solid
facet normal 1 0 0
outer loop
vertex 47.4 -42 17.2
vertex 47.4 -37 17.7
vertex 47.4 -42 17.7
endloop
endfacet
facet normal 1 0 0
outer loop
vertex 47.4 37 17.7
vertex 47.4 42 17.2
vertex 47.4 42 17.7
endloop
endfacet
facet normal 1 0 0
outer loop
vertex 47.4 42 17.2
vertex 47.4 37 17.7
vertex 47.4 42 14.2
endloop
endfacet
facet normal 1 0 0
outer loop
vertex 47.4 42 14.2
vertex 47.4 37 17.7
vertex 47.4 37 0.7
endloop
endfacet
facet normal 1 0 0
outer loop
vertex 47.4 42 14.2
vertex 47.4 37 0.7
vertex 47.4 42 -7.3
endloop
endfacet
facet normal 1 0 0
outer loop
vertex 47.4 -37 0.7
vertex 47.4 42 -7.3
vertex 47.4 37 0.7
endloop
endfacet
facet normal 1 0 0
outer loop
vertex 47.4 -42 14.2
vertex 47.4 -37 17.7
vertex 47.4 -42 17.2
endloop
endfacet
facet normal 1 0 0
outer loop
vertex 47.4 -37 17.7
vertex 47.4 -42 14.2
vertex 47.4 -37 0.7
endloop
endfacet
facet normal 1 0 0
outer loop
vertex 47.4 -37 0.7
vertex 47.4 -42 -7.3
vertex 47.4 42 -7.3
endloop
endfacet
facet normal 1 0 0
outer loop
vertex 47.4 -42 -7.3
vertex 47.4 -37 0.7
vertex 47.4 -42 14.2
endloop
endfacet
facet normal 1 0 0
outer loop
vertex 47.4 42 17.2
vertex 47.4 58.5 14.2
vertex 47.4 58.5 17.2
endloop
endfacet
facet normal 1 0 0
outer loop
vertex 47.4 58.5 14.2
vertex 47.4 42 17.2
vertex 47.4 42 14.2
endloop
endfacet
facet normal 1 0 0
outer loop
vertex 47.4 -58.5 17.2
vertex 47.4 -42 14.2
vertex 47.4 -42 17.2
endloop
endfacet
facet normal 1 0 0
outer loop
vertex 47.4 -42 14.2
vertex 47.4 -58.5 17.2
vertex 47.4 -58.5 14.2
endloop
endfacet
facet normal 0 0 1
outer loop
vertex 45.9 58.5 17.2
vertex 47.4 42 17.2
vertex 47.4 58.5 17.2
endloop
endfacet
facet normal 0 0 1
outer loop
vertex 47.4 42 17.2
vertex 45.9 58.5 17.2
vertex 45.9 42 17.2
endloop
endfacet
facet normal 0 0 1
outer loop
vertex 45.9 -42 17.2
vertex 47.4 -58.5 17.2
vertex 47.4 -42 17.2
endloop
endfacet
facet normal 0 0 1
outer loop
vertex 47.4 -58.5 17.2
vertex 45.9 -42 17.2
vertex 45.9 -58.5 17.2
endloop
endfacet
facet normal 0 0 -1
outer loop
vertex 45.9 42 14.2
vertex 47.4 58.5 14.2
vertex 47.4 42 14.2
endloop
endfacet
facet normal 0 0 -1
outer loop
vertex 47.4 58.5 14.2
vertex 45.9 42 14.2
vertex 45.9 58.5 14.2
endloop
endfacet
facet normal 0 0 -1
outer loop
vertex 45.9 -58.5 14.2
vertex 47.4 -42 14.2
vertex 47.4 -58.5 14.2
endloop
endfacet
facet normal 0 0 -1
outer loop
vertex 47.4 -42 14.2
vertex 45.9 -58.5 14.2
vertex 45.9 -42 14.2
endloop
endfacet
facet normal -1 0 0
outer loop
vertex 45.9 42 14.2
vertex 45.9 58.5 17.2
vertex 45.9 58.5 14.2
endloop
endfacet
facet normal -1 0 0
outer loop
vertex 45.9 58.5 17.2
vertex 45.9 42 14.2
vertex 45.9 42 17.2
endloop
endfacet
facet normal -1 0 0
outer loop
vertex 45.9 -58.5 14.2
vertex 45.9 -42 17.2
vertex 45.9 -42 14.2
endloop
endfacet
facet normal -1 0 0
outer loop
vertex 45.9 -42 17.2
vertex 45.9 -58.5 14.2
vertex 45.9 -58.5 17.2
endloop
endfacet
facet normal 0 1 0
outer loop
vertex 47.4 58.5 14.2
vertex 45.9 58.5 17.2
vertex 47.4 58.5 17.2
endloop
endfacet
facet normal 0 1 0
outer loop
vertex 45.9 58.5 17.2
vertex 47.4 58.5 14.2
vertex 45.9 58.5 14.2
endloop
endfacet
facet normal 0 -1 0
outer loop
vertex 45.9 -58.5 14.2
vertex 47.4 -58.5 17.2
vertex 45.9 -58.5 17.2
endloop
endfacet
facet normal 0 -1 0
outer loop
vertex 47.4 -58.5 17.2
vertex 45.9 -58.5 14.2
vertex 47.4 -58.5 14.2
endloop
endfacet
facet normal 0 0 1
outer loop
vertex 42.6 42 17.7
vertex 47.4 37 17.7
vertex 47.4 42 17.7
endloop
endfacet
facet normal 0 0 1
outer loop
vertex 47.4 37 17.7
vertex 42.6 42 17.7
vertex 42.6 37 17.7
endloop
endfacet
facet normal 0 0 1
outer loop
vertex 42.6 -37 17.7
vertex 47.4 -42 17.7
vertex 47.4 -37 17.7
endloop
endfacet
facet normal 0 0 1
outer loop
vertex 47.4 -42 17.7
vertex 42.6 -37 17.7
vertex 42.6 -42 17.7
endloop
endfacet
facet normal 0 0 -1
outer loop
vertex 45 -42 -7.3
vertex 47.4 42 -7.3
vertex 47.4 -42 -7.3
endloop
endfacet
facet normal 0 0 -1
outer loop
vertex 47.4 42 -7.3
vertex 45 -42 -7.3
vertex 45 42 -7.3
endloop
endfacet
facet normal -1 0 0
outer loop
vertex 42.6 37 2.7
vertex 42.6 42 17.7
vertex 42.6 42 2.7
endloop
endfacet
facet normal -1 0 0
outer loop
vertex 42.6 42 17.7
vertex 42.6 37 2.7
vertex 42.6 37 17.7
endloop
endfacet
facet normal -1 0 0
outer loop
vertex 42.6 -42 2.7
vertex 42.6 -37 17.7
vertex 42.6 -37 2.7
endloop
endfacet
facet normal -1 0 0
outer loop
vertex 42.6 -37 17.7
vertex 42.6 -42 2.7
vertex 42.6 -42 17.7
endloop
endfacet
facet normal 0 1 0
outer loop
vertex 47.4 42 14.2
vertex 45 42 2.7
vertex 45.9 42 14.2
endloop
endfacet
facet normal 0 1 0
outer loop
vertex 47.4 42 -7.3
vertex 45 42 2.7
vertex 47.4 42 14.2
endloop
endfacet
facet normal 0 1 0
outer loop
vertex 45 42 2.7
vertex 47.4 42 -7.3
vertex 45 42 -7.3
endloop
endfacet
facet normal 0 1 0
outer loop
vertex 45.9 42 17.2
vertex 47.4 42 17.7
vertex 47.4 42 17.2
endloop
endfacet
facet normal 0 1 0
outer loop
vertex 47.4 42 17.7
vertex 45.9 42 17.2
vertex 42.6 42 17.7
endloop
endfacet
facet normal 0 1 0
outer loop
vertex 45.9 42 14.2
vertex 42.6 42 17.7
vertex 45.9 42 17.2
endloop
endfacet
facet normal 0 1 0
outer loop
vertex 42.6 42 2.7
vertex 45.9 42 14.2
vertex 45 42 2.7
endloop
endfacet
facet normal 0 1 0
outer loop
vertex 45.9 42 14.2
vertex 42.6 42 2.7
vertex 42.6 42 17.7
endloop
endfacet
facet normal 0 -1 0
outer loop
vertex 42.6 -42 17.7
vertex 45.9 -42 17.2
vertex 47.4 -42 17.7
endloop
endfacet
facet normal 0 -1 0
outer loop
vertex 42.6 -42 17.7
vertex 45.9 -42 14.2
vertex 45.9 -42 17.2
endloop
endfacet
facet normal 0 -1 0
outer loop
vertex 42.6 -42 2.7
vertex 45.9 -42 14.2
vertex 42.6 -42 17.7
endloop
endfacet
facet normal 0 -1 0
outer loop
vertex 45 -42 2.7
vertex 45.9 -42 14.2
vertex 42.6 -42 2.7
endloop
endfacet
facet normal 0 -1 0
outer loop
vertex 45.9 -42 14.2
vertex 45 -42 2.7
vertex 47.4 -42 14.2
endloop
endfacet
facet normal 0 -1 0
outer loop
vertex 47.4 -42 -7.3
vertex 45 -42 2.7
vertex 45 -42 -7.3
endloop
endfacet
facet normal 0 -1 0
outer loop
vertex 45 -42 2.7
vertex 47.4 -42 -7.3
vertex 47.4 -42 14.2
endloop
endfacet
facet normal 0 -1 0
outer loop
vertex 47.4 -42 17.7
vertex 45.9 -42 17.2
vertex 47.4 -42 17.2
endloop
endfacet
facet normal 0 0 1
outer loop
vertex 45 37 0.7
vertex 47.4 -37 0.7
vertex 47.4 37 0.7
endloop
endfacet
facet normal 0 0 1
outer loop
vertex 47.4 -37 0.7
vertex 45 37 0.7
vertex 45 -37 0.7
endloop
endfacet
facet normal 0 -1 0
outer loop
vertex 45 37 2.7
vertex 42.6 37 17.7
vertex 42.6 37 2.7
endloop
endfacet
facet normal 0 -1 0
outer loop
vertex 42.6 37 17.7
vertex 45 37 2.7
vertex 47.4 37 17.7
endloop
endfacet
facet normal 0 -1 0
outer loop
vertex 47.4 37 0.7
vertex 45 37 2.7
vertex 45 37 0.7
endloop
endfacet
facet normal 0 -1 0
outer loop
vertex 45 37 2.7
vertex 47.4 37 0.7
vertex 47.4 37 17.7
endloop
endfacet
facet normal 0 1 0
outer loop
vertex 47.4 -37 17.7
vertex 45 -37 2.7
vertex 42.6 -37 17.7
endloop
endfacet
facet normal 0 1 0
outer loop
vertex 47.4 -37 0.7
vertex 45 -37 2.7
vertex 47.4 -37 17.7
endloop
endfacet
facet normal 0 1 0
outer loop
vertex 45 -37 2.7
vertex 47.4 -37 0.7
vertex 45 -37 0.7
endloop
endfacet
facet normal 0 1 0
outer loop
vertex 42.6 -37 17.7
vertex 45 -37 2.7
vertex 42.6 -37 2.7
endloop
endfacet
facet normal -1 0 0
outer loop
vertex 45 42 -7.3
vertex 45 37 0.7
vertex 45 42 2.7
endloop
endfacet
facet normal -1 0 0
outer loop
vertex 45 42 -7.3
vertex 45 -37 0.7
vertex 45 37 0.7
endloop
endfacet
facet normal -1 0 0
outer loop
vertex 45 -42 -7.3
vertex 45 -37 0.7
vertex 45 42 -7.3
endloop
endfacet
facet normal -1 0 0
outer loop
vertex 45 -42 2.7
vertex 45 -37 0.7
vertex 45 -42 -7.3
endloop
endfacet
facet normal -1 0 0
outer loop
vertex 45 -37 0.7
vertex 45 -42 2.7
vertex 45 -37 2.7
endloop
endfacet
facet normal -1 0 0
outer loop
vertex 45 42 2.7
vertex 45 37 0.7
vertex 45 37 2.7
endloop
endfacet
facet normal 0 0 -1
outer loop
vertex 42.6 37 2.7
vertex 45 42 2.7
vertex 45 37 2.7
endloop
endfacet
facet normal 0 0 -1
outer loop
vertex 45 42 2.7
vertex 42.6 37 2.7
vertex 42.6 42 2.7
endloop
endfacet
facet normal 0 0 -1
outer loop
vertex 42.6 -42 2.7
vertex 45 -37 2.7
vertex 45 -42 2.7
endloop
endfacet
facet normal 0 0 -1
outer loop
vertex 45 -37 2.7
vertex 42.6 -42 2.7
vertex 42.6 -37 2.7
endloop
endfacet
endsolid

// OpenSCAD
use <MCAD/boxes.scad>

$fn=50;

height = 25;

glass_x = 102;
glass_y = 82;
glass_h = 2.7;
wall = 3;

wet_x = glass_x + 25;
wet_y = glass_y + 10;

comb_tooth_h = 10;

comb_site_tooth_h = 5;
comb_site_top_h = wall+glass_h+comb_tooth_h+comb_site_tooth_h;
comb_site_tooth_h = 5;
wire_holder_z = 5;

wire_d = 2;

istep = 10;
comb_site_width = 6;
comb_site_count = 9;

banana_d = 5+0.5;

hole_d = 3.2;

font = "Liberation Sans";

// for 0.3mm
comb_thick_x = 4.8;
comb_thin_x = 1.5;
comb_well_x = 1.5;

module border() {
  h = height;
  translate([0, 0, -h/2]) {
    difference() {
      union() {
        // handle
        translate([-(comb_thin_x-comb_thick_x)/2, 0, h/2-4/2]) {
          cube([comb_thin_x, wet_y+25, 3], center=true);
        }
        // with side gap along y
        cube([comb_thick_x, wet_y-8, h], center=true);
      }
      // remove top
      translate([0, 0, 6]) {
        cube([comb_thick_x, wet_y-18, h-4], center=true);
      }
      // make middle thinner
      translate([-(comb_thick_x-comb_thin_x)/2, 0, -12]) {
        cube([comb_thick_x-comb_thin_x, wet_y, h-6], center=true);
      }
    }
  }
}

module comb() {
  h = 15;
  tooth_size = 5;
  translate([0, 0, h/2-height/2]) {
    // handle
    difference() {
      union() {
        // handle
        translate([(comb_thick_x-comb_thin_x)/2, 0, 6]) {
          cube([comb_thin_x, wet_y+25, 4], center=true);
        }
        // with side gap along y
        cube([comb_thick_x, wet_y-3, h], center=true);
      }
      // remove top
      translate([0, 0, 4]) {
        cube([comb_thick_x, wet_y-10, h-3], center=true);
      }
      // make middle thinner
      translate([(comb_thick_x-comb_thin_x)/2, 0, 0]) {
        cube([comb_thin_x, wet_y-10, h-3], center=true);
      }
    }
    // comb
    translate([0, 0, -comb_tooth_h/2-h/2]) {
      for(y=[-3:1:3]) {
        translate([(comb_thick_x-comb_well_x)/2, y * 10, 0]) {
          cube([comb_well_x, tooth_size, comb_tooth_h], center=true);
        }
      }
    }
  }
}

module banana_hole(socket=false) {
  translate([0, glass_y/2, height/2-10]) {
    rotate([90, 0, 0]) {
      if(socket) {
        translate([-1, 5, -10]) {
          cylinder(d=banana_d, h=50, center=true);
        }
      } else {
        translate([-2, 1, -22]) {
          roundedBox([10, 16, 30], 5, true);
          translate([0, 4, 0]) {
            cylinder(d=hole_d, h=50, center=true);
          }
          // for wire
          translate([7, 4, 0]) {
            cylinder(d=2.5, h=50, center=true);
          }
        }
      }
    }
  }
}

module wire_holder() {
  d_pad = 2;
  d = wire_d + d_pad*2;
  w = 2;
  translate([-d/4, 0, -d/4*3]) {
    union() {
      difference() {
        rotate([90, 0, 0]) {
          difference() {
            cylinder(d=d, h=w, center=true);
            cylinder(d=wire_d, h=w, center=true);
          }
        }
        translate([0, 0, -d/2]) {
          cube([d, w*2, d], center=true);
        }
        translate([-d/2, 0, 0]) {
          cube([d, w*2, d], center=true);
        }
      }
      translate([-d/4, 0, wire_d]) {
        cube([d/4*3, w, d_pad], center=true);
      }
      translate([wire_d, 0, -d/4]) {
        cube([d_pad, w, d/4*3], center=true);
      }
    }
  }
//  hh = 3.5;
//  hw = 6;
//  translate([2, 0, wall+glass_h-height/2+hh/2]) {
//    cube([3, 2, hh], center=true);
//    translate([1.5-hw/2, 0, hh/2]) {
//      cube([hw, 2, 2], center=true);
//    }
//  }
}

module chamber() {
  difference() {
//  union() {
    // walls
    cube([wet_x+2*wall, wet_y+2*wall, height], center=true);
    translate([0, 0, 0]) {
      // attach zone
      translate([0, 0, comb_site_top_h]) {
        cube([glass_x, wet_y, height], center=true);
        // comb zone
        comb_start = -comb_site_count/2;
        comb_end = comb_site_count/2;
        for(i=[comb_start:comb_end]) {
          translate([i*istep, 0, 0]) {
            translate([0, 0, -comb_site_tooth_h]) {
              cube([comb_site_width, wet_y, height], center=true);
            }
            // get low to the glass level for rubber
            translate([0, 0, -comb_site_top_h+wall+glass_h]) {
              if(i == comb_start) {
                cube([5, glass_y+5, height], center=true);
              } else if(i == comb_end) {
                cube([5, glass_y+5, height], center=true);
              }
            }
          }
        }
      }
      // water zone
      translate([0, 0, 3+glass_h]) {
        cube([wet_x, glass_y, height], center=true);
      }
      // extraction bigger
      translate([0, 0, 3]) {
        cube([glass_x, glass_y, height], center=true);
      }
      translate([0, 0, 0]) {
        // extraction smaller with pads
        cube([glass_x-5, glass_y-7, height], center=true);
      }
      // plus
      translate([glass_x/2+5, 0, 0]) {
//!difference() {
//!union() {
//  translate([-10, 76, -6]) {
//  cube([17, 2, 20]);
//  }
        banana_hole();
//}
      }
      // minus
      translate([-glass_x/2-5, 0, 0]) {
        banana_hole(socket=true);
      }      
    }
    for(x=[-glass_x/2-5, glass_x/2+5]) {
      for(y=[-glass_y/2-4, glass_y/2+4]) {
        translate([x, y, -height/2-1]) {
          cylinder(d=3.2, h=12);
        }
      }
    }
    translate([wet_x/2+wall, wet_y/2-20, 0]) {
      rotate([90, 0, 90]) {
        linear_extrude(height = 2) {
          text("PLUS", font = font, size = 5, direction = "ltr", spacing = 1 );
        }
      }
    }
    translate([-wet_x/2-wall, wet_y/2, 0]) {
      rotate([90, 0, 270]) {
        linear_extrude(height = wall-2) {
          text("MINUS", font = font, size = 5, direction = "ltr", spacing = 1 );
        }
      }
    }
  }
  translate([0, 0, 0]) {
    for(i=[-1.5:1.5]) {
      translate([-glass_x/2-9, i*(glass_y/4.5), 0]) {
        wire_holder();
      }
      translate([glass_x/2+9, i*(glass_y/4.5), 0]) {
          rotate([0, 0, 180]) {
            wire_holder();
          }
      }
    }
  }
}

//chamber();
translate([comb_site_width-1, 0, comb_site_top_h-comb_site_tooth_h]) {
//	comb();
  translate([glass_x/2-11, 0, 2]) {
    border();
  }
}
